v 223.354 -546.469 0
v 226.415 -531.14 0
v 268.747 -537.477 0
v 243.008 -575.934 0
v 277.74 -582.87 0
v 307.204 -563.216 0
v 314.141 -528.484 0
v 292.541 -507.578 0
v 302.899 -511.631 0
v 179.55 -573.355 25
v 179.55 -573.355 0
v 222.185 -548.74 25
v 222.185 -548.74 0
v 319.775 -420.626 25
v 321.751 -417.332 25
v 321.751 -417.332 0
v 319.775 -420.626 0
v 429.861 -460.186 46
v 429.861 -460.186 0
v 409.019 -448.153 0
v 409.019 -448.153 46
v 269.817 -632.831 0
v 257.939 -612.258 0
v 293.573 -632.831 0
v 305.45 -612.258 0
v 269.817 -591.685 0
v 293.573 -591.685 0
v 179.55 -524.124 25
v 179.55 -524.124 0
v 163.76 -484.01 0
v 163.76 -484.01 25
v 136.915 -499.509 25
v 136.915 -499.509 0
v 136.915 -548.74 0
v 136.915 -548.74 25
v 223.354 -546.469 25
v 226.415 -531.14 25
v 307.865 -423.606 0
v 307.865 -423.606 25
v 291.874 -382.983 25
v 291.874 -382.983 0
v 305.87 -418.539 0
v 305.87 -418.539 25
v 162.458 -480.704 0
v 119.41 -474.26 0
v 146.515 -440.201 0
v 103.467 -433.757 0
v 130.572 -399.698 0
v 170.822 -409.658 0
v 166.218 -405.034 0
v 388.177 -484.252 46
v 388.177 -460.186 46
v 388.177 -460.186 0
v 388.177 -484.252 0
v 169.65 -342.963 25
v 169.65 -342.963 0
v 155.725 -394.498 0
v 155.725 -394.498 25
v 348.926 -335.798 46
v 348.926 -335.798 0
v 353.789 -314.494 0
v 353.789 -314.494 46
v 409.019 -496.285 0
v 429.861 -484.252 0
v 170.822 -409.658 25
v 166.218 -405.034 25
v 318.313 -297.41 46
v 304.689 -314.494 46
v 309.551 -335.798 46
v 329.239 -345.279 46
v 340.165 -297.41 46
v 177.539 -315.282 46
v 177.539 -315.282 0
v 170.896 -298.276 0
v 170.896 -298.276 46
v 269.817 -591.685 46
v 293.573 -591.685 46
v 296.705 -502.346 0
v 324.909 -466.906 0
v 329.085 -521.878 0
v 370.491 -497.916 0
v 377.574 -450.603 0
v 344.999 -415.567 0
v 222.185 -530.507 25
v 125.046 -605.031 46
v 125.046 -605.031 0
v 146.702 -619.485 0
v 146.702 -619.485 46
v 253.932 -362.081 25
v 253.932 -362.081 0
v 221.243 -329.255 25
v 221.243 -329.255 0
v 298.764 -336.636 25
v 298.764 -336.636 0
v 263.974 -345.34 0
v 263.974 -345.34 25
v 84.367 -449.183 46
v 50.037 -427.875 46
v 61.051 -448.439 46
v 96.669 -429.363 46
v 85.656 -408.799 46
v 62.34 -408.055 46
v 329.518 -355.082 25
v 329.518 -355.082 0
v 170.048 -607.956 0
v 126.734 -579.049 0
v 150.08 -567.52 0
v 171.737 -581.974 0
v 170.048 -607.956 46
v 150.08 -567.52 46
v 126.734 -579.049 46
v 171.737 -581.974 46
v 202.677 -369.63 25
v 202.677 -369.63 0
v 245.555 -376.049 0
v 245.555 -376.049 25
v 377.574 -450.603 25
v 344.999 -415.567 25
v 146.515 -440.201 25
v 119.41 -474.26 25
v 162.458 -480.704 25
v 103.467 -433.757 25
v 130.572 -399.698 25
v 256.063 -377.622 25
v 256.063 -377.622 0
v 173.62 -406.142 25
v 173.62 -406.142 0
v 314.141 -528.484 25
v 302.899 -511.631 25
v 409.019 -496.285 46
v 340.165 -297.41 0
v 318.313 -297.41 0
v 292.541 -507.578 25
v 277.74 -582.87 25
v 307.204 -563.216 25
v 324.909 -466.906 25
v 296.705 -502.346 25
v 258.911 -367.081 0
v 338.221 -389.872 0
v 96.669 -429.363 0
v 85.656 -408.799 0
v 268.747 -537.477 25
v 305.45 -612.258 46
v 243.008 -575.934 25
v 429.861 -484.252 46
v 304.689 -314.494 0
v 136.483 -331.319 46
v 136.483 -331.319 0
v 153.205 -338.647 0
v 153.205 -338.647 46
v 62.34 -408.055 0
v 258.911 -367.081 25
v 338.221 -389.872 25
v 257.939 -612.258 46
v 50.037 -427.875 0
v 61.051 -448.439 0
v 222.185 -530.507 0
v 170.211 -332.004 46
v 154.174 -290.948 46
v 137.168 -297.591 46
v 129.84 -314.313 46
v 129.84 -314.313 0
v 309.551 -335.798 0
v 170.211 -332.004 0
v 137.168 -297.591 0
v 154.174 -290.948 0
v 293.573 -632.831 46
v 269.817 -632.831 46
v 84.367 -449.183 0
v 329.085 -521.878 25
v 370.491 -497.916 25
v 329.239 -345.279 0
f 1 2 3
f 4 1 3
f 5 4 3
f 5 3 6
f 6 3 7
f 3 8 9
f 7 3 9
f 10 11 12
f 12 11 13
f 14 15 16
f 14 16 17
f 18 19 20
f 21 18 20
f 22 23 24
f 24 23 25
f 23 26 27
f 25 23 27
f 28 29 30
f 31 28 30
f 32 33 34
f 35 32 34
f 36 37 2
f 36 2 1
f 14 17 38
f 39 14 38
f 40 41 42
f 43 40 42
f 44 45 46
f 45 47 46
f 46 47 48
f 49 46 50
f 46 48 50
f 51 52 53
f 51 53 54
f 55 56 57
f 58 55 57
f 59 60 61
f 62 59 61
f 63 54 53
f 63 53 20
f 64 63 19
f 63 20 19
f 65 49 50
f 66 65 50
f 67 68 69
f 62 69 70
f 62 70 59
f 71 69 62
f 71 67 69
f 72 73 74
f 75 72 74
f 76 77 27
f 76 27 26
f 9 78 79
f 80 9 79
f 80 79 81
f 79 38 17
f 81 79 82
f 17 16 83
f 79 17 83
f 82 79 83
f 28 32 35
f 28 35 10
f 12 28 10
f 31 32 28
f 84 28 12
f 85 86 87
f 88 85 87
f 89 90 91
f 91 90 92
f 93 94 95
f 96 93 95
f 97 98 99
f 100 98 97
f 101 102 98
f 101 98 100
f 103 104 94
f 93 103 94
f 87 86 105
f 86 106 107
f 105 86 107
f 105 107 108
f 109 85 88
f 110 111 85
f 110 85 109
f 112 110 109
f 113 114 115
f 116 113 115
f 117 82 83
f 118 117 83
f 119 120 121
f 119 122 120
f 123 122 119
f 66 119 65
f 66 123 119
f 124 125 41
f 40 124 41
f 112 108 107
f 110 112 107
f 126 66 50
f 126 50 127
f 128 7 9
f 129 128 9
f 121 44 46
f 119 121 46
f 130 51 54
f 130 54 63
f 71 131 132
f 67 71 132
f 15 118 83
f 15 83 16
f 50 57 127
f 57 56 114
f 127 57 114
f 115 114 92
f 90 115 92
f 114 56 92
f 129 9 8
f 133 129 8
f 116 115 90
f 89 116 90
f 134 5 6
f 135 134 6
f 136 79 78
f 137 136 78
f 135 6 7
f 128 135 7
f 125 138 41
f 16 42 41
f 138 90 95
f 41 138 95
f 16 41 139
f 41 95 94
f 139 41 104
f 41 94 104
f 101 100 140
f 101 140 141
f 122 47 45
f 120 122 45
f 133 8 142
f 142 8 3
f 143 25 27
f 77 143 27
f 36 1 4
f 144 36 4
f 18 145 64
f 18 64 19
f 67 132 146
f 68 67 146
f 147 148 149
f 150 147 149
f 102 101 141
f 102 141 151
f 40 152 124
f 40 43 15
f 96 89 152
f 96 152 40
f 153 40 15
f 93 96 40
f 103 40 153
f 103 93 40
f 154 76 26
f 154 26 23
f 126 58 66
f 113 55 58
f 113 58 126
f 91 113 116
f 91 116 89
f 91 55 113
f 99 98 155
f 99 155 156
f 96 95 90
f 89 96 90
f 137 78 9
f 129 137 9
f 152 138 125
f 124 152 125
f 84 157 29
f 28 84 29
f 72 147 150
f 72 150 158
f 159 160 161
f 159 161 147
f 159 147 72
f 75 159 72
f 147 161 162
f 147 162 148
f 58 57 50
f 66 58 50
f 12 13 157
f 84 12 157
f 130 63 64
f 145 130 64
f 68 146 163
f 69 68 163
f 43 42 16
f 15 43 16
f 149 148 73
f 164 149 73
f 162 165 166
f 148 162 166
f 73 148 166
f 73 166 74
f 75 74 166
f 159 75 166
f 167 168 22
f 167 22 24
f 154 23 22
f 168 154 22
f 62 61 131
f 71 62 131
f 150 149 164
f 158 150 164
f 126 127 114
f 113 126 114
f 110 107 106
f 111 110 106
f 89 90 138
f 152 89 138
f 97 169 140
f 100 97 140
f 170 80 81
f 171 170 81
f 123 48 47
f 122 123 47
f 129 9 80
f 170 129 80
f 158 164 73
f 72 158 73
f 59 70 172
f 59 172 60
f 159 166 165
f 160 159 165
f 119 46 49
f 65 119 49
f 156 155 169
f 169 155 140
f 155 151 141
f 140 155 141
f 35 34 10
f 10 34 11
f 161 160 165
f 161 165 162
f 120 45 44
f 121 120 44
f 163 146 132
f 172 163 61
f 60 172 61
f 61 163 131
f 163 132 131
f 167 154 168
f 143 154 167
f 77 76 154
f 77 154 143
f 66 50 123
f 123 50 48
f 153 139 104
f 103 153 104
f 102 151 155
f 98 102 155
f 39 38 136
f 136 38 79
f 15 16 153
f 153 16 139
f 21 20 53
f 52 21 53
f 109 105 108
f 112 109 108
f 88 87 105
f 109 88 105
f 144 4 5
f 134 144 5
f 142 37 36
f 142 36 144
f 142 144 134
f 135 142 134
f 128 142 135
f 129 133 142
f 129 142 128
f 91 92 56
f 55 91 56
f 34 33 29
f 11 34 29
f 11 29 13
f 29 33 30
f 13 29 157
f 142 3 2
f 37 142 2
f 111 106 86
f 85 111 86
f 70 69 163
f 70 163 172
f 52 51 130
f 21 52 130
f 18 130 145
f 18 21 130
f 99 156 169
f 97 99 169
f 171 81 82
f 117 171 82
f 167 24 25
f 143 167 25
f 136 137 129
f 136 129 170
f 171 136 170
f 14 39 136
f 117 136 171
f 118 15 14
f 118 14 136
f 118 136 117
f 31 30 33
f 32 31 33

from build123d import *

# Parameters (mm, degrees)
F1_DEPTH = 25
F5_DEPTH = 46


# Not quite as in the source:
# - the program builds the solid bodies; features that only make, move or delete a surface that nothing else refers to are left out


with BuildPart() as f1:
    # F0 (on Top) → F1 (new body)
    with BuildSketch(Plane.XY):
        Polygon((222.1852089025, -548.7398207486), (222.1852089025, -530.5067178582), (179.5499098826, -524.1243193825), (163.7595795897, -484.0098680956), (136.9146108627, -499.5088180164), (136.9146108627, -548.7398207486), (179.5499098826, -573.3553221147), align=None)
    extrude(amount=F1_DEPTH)


with BuildPart() as f1b:
    # F0 (on Top) → F1, piece 2 (new body)
    with BuildSketch(Plane.XY):
        Polygon((119.4099858602, -474.2598081213), (162.4582974419, -480.7040335526), (146.5150045824, -440.2009894172), (170.8221101954, -409.6578891972), (166.217670693, -405.0340568941), (130.5717117228, -399.6979452818), (103.4666930007, -433.7567639858), align=None)
    extrude(amount=F1_DEPTH)


with BuildPart() as f1c:
    # F0 (on Top) → F1, piece 3 (new body)
    with BuildSketch(Plane.XY):
        Polygon((166.217670693, -405.0340568941), (173.6200233045, -406.1421707132), (202.6772876524, -369.6302572329), (245.5548420979, -376.0489207447), (253.9323629055, -362.0813747017), (221.2432641031, -329.2545972135), (169.6503089808, -342.9627487539), (155.7254388925, -394.4976343163), align=None)
    extrude(amount=F1_DEPTH)


with BuildPart() as f1d:
    # F0 (on Top) → F1, piece 4 (new body)
    with BuildSketch(Plane.XY):
        Polygon((258.9113491372, -367.0813312356), (256.0632308556, -377.6220004681), (291.8744760227, -382.982855014), (305.8703483184, -418.5385860855), (321.7506056308, -417.3324661794), (338.2210194956, -389.8719239393), (329.5177385501, -355.0822071929), (298.763544948, -336.6363115411), (263.9738282016, -345.3395924866), (253.9323629055, -362.0813747017), align=None)
    extrude(amount=F1_DEPTH)


with BuildPart() as f1e:
    # F0 (on Top) → F1, piece 5 (new body)
    with BuildSketch(Plane.XY):
        Polygon((324.9093813229, -466.9061849793), (296.7051560656, -502.3462119564), (302.8987264088, -511.6312355413), (329.0845431676, -521.8780365199), (370.4912763382, -497.9163008296), (377.5739128611, -450.6033154129), (344.999082975, -415.5667232977), (321.7506056308, -417.3324661794), (319.7751238438, -420.6261175414), (307.8649156693, -423.605672926), align=None)
    extrude(amount=F1_DEPTH)


with BuildPart() as f1f:
    # F0 (on Top) → F1, piece 6 (new body)
    with BuildSketch(Plane.XY):
        Polygon((268.7470982529, -537.4769171636), (226.4152229627, -531.1399404674), (223.3535547567, -546.4694037319), (243.0076640568, -575.933647824), (277.7395848212, -582.8704606597), (307.2038289133, -563.2163513596), (314.140641749, -528.4844305953), (302.8987264088, -511.6312355413), (292.541328463, -507.5782706716), align=None)
    extrude(amount=F1_DEPTH)


with BuildPart() as f5:
    # F4 (on Top) → F5 (new body)
    with BuildSketch(Plane.XY):
        Polygon((50.0373041585, -427.8748940379), (61.0507631347, -448.4392095655), (84.3667122812, -449.1834320724), (96.6692024515, -429.3633390516), (85.6557434752, -408.7990235239), (62.3397943287, -408.0548010171), align=None)
    extrude(amount=F5_DEPTH)


with BuildPart() as f5b:
    # F4 (on Top) → F5, piece 2 (new body)
    with BuildSketch(Plane.XY):
        Polygon((137.167817033, -297.5910984255), (129.8400703304, -314.3133761923), (136.4830069519, -331.3193115823), (153.2052847187, -338.647058285), (170.2112201088, -332.0041216635), (177.5389668114, -315.2818438967), (170.8960301899, -298.2759085066), (154.1737524231, -290.948161804), align=None)
    extrude(amount=F5_DEPTH)


with BuildPart() as f5c:
    # F4 (on Top) → F5, piece 3 (new body)
    with BuildSketch(Plane.XY):
        Polygon((429.8605322838, -484.2521358655), (429.8605322838, -460.1862620189), (409.0188741684, -448.1533250956), (388.177216053, -460.1862620189), (388.177216053, -484.2521358655), (409.0188741684, -496.2850727887), align=None)
    extrude(amount=F5_DEPTH)


with BuildPart() as f5d:
    # F4 (on Top) → F5, piece 4 (new body)
    with BuildSketch(Plane.XY):
        Polygon((269.8167730025, -632.8309774399), (293.5725879022, -632.8309774399), (305.450495352, -612.2578382492), (293.5725879022, -591.6846990585), (269.8167730025, -591.6846990585), (257.9388655527, -612.2578382492), align=None)
    extrude(amount=F5_DEPTH)


with BuildPart() as f5e:
    # F4 (on Top) → F5, piece 5 (new body)
    with BuildSketch(Plane.XY):
        Polygon((125.04553228, -605.0311075118), (146.7024442616, -619.4845689866), (170.0479650622, -607.9558637804), (171.7365738812, -581.9736970994), (150.0796618995, -567.5202356246), (126.7341410989, -579.0489408308), align=None)
    extrude(amount=F5_DEPTH)


with BuildPart() as f5f:
    # F4 (on Top) → F5, piece 6 (new body)
    with BuildSketch(Plane.XY):
        Polygon((340.1645370866, -297.4101305008), (318.3130076979, -297.4101305008), (304.688801969, -314.494344117), (309.551224697, -335.7980100419), (329.2387723923, -345.2790333185), (348.9263200876, -335.7980100419), (353.7887428155, -314.494344117), align=None)
    extrude(amount=F5_DEPTH)


solid = Compound([f1.part, f1b.part, f1c.part, f1d.part, f1e.part, f1f.part, f5.part, f5b.part, f5c.part, f5d.part, f5e.part, f5f.part])
